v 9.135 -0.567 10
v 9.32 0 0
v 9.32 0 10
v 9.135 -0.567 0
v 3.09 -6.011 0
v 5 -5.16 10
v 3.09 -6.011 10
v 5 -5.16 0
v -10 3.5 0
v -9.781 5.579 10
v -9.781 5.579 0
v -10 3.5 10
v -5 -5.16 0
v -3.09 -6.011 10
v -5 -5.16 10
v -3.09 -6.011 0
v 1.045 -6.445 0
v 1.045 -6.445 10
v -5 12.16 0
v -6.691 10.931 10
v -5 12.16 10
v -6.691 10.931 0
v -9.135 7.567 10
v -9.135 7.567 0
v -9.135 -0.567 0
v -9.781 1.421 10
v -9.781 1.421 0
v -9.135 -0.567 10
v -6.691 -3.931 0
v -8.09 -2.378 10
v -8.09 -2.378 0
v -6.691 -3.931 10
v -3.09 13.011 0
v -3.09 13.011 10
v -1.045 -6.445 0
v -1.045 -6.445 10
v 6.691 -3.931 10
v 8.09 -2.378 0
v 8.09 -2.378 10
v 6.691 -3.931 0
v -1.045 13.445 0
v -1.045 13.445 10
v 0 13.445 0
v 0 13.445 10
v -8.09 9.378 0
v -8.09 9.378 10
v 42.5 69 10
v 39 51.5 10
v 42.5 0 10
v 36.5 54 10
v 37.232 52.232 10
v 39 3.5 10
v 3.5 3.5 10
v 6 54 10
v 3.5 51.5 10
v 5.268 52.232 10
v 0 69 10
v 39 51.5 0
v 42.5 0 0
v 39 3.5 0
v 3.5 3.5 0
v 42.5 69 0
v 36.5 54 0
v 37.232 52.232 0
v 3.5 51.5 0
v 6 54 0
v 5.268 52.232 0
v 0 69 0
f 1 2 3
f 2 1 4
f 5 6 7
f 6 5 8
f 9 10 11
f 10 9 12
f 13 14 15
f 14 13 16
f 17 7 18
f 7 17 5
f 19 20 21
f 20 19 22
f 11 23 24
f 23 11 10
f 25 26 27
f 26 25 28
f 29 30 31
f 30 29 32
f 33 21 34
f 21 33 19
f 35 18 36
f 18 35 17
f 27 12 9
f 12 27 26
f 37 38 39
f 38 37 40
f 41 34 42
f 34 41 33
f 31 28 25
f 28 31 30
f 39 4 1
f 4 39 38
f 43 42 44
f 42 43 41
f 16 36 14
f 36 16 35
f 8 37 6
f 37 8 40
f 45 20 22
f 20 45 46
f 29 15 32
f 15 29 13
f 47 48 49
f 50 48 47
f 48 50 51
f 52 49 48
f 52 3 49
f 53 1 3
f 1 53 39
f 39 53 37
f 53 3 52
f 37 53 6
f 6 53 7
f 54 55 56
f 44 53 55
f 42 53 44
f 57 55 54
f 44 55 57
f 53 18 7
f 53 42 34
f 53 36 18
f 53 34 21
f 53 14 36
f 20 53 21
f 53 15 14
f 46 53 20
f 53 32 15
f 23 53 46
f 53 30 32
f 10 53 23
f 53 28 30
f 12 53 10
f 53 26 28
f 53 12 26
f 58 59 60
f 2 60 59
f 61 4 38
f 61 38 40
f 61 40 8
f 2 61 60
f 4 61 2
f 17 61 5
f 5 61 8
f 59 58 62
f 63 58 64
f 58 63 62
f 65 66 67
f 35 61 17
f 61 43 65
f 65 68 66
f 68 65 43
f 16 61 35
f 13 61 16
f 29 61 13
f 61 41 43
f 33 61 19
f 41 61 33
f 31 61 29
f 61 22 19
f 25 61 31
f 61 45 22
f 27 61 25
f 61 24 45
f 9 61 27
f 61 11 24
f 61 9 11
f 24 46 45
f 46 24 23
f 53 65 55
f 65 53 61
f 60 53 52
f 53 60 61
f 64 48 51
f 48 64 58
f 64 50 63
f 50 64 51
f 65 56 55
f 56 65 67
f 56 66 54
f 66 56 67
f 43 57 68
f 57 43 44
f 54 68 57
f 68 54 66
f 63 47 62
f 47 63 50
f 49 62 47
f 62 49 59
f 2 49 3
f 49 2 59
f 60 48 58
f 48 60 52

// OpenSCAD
door_thickness = 35.5;
length = 60; // not overall length, doesn't include the guides
height = 10;
stop_size = 20;
tensioner = 5;
part_thickness = 7;
door_guides = true;
door_tensioners = true;



cube([(door_thickness + (part_thickness)), (part_thickness/2), height]);

cube([(part_thickness/2), (length), height]);

translate([(door_thickness + (part_thickness/2)),0,0])
cube([(part_thickness/2), (length), height]);



difference(){

translate([0,part_thickness/2, height/2]) 
    color("blue") 
    cylinder(r=stop_size/2,h=height,center=true)
     //cube([door_thickness + part_thickness, (length - part_thickness) + (part_thickness/2), height])

    ;  
      
   
translate([part_thickness/2,part_thickness/2,0]) 
    color("Orange")
    cube([door_thickness, (length - part_thickness), height])
    ;
}



if (door_tensioners) {
//tensioner 1
translate([(part_thickness/2)+door_thickness,
            ((length - part_thickness)+(part_thickness/2))-(tensioner/2), 
            (height/2)]) 
         color("red") 
            cylinder(r=tensioner/2,h=height,center=true);


//tensioner 2
translate([part_thickness/2,
            ((length - part_thickness)+(part_thickness/2))-(tensioner/2), 
            (height/2)]) 
        color("green") 
            cylinder(r=tensioner/2,h=height,center=true);
}




//Guides to help put onto door
module guide0(l, w, h, trnx, trny){
    

translate([trnx,trny,height])
    rotate([90,90,180])
    
    color("pink") 
    polyhedron(
               points=[[0,0,0], [l,0,0], [l,w,0], [0,w,0], [0,w,h], [l,w,h]],
               faces=[[0,1,2,3],[5,4,3,2],[0,4,5,1],[0,3,4],[5,2,1]]
               );
}
module guide1(l, w, h, trnx, trny){
translate([trnx,trny,0]) 
    
    rotate([180,270,90])
    
    color("purple") 
    polyhedron(
               points=[[0,0,0], [l,0,0], [l,w,0], [0,w,0], [0,w,h], [l,w,h]],
               faces=[[0,1,2,3],[5,4,3,2],[0,4,5,1],[0,3,4],[5,2,1]]
               );
}




if (door_guides) {
    if (door_tensioners) {
        guide0(height, (part_thickness/2)+(tensioner/2), (tensioner*3), 
                (part_thickness/2)+(tensioner/2), 
                ((length - part_thickness)+(part_thickness/2))-(tensioner/2));
        
        
        guide1(height, (part_thickness/2)+(tensioner/2), (tensioner*3),
                (part_thickness/2)-(tensioner/2)+door_thickness,
                ((length - part_thickness)+(part_thickness/2))-(tensioner/2));
    }
    else{
         guide0(height, (part_thickness/2), (tensioner*3),
                (part_thickness/2), 
                ((length - part_thickness)+(part_thickness/2)));
        
         guide1(height, (part_thickness/2), (tensioner*3),
                (door_thickness+part_thickness/2),
                ((length - part_thickness)+(part_thickness/2)));
        
    }
}





//difference(){
//  cube([door_thickness + part_thickness, (length - part_thickness) + (part_thickness/2), height]);  
 // translate([part_thickness/2,part_thickness/2,0]) color("Orange") cube([door_thickness, (length - part_thickness), height]);
//}
